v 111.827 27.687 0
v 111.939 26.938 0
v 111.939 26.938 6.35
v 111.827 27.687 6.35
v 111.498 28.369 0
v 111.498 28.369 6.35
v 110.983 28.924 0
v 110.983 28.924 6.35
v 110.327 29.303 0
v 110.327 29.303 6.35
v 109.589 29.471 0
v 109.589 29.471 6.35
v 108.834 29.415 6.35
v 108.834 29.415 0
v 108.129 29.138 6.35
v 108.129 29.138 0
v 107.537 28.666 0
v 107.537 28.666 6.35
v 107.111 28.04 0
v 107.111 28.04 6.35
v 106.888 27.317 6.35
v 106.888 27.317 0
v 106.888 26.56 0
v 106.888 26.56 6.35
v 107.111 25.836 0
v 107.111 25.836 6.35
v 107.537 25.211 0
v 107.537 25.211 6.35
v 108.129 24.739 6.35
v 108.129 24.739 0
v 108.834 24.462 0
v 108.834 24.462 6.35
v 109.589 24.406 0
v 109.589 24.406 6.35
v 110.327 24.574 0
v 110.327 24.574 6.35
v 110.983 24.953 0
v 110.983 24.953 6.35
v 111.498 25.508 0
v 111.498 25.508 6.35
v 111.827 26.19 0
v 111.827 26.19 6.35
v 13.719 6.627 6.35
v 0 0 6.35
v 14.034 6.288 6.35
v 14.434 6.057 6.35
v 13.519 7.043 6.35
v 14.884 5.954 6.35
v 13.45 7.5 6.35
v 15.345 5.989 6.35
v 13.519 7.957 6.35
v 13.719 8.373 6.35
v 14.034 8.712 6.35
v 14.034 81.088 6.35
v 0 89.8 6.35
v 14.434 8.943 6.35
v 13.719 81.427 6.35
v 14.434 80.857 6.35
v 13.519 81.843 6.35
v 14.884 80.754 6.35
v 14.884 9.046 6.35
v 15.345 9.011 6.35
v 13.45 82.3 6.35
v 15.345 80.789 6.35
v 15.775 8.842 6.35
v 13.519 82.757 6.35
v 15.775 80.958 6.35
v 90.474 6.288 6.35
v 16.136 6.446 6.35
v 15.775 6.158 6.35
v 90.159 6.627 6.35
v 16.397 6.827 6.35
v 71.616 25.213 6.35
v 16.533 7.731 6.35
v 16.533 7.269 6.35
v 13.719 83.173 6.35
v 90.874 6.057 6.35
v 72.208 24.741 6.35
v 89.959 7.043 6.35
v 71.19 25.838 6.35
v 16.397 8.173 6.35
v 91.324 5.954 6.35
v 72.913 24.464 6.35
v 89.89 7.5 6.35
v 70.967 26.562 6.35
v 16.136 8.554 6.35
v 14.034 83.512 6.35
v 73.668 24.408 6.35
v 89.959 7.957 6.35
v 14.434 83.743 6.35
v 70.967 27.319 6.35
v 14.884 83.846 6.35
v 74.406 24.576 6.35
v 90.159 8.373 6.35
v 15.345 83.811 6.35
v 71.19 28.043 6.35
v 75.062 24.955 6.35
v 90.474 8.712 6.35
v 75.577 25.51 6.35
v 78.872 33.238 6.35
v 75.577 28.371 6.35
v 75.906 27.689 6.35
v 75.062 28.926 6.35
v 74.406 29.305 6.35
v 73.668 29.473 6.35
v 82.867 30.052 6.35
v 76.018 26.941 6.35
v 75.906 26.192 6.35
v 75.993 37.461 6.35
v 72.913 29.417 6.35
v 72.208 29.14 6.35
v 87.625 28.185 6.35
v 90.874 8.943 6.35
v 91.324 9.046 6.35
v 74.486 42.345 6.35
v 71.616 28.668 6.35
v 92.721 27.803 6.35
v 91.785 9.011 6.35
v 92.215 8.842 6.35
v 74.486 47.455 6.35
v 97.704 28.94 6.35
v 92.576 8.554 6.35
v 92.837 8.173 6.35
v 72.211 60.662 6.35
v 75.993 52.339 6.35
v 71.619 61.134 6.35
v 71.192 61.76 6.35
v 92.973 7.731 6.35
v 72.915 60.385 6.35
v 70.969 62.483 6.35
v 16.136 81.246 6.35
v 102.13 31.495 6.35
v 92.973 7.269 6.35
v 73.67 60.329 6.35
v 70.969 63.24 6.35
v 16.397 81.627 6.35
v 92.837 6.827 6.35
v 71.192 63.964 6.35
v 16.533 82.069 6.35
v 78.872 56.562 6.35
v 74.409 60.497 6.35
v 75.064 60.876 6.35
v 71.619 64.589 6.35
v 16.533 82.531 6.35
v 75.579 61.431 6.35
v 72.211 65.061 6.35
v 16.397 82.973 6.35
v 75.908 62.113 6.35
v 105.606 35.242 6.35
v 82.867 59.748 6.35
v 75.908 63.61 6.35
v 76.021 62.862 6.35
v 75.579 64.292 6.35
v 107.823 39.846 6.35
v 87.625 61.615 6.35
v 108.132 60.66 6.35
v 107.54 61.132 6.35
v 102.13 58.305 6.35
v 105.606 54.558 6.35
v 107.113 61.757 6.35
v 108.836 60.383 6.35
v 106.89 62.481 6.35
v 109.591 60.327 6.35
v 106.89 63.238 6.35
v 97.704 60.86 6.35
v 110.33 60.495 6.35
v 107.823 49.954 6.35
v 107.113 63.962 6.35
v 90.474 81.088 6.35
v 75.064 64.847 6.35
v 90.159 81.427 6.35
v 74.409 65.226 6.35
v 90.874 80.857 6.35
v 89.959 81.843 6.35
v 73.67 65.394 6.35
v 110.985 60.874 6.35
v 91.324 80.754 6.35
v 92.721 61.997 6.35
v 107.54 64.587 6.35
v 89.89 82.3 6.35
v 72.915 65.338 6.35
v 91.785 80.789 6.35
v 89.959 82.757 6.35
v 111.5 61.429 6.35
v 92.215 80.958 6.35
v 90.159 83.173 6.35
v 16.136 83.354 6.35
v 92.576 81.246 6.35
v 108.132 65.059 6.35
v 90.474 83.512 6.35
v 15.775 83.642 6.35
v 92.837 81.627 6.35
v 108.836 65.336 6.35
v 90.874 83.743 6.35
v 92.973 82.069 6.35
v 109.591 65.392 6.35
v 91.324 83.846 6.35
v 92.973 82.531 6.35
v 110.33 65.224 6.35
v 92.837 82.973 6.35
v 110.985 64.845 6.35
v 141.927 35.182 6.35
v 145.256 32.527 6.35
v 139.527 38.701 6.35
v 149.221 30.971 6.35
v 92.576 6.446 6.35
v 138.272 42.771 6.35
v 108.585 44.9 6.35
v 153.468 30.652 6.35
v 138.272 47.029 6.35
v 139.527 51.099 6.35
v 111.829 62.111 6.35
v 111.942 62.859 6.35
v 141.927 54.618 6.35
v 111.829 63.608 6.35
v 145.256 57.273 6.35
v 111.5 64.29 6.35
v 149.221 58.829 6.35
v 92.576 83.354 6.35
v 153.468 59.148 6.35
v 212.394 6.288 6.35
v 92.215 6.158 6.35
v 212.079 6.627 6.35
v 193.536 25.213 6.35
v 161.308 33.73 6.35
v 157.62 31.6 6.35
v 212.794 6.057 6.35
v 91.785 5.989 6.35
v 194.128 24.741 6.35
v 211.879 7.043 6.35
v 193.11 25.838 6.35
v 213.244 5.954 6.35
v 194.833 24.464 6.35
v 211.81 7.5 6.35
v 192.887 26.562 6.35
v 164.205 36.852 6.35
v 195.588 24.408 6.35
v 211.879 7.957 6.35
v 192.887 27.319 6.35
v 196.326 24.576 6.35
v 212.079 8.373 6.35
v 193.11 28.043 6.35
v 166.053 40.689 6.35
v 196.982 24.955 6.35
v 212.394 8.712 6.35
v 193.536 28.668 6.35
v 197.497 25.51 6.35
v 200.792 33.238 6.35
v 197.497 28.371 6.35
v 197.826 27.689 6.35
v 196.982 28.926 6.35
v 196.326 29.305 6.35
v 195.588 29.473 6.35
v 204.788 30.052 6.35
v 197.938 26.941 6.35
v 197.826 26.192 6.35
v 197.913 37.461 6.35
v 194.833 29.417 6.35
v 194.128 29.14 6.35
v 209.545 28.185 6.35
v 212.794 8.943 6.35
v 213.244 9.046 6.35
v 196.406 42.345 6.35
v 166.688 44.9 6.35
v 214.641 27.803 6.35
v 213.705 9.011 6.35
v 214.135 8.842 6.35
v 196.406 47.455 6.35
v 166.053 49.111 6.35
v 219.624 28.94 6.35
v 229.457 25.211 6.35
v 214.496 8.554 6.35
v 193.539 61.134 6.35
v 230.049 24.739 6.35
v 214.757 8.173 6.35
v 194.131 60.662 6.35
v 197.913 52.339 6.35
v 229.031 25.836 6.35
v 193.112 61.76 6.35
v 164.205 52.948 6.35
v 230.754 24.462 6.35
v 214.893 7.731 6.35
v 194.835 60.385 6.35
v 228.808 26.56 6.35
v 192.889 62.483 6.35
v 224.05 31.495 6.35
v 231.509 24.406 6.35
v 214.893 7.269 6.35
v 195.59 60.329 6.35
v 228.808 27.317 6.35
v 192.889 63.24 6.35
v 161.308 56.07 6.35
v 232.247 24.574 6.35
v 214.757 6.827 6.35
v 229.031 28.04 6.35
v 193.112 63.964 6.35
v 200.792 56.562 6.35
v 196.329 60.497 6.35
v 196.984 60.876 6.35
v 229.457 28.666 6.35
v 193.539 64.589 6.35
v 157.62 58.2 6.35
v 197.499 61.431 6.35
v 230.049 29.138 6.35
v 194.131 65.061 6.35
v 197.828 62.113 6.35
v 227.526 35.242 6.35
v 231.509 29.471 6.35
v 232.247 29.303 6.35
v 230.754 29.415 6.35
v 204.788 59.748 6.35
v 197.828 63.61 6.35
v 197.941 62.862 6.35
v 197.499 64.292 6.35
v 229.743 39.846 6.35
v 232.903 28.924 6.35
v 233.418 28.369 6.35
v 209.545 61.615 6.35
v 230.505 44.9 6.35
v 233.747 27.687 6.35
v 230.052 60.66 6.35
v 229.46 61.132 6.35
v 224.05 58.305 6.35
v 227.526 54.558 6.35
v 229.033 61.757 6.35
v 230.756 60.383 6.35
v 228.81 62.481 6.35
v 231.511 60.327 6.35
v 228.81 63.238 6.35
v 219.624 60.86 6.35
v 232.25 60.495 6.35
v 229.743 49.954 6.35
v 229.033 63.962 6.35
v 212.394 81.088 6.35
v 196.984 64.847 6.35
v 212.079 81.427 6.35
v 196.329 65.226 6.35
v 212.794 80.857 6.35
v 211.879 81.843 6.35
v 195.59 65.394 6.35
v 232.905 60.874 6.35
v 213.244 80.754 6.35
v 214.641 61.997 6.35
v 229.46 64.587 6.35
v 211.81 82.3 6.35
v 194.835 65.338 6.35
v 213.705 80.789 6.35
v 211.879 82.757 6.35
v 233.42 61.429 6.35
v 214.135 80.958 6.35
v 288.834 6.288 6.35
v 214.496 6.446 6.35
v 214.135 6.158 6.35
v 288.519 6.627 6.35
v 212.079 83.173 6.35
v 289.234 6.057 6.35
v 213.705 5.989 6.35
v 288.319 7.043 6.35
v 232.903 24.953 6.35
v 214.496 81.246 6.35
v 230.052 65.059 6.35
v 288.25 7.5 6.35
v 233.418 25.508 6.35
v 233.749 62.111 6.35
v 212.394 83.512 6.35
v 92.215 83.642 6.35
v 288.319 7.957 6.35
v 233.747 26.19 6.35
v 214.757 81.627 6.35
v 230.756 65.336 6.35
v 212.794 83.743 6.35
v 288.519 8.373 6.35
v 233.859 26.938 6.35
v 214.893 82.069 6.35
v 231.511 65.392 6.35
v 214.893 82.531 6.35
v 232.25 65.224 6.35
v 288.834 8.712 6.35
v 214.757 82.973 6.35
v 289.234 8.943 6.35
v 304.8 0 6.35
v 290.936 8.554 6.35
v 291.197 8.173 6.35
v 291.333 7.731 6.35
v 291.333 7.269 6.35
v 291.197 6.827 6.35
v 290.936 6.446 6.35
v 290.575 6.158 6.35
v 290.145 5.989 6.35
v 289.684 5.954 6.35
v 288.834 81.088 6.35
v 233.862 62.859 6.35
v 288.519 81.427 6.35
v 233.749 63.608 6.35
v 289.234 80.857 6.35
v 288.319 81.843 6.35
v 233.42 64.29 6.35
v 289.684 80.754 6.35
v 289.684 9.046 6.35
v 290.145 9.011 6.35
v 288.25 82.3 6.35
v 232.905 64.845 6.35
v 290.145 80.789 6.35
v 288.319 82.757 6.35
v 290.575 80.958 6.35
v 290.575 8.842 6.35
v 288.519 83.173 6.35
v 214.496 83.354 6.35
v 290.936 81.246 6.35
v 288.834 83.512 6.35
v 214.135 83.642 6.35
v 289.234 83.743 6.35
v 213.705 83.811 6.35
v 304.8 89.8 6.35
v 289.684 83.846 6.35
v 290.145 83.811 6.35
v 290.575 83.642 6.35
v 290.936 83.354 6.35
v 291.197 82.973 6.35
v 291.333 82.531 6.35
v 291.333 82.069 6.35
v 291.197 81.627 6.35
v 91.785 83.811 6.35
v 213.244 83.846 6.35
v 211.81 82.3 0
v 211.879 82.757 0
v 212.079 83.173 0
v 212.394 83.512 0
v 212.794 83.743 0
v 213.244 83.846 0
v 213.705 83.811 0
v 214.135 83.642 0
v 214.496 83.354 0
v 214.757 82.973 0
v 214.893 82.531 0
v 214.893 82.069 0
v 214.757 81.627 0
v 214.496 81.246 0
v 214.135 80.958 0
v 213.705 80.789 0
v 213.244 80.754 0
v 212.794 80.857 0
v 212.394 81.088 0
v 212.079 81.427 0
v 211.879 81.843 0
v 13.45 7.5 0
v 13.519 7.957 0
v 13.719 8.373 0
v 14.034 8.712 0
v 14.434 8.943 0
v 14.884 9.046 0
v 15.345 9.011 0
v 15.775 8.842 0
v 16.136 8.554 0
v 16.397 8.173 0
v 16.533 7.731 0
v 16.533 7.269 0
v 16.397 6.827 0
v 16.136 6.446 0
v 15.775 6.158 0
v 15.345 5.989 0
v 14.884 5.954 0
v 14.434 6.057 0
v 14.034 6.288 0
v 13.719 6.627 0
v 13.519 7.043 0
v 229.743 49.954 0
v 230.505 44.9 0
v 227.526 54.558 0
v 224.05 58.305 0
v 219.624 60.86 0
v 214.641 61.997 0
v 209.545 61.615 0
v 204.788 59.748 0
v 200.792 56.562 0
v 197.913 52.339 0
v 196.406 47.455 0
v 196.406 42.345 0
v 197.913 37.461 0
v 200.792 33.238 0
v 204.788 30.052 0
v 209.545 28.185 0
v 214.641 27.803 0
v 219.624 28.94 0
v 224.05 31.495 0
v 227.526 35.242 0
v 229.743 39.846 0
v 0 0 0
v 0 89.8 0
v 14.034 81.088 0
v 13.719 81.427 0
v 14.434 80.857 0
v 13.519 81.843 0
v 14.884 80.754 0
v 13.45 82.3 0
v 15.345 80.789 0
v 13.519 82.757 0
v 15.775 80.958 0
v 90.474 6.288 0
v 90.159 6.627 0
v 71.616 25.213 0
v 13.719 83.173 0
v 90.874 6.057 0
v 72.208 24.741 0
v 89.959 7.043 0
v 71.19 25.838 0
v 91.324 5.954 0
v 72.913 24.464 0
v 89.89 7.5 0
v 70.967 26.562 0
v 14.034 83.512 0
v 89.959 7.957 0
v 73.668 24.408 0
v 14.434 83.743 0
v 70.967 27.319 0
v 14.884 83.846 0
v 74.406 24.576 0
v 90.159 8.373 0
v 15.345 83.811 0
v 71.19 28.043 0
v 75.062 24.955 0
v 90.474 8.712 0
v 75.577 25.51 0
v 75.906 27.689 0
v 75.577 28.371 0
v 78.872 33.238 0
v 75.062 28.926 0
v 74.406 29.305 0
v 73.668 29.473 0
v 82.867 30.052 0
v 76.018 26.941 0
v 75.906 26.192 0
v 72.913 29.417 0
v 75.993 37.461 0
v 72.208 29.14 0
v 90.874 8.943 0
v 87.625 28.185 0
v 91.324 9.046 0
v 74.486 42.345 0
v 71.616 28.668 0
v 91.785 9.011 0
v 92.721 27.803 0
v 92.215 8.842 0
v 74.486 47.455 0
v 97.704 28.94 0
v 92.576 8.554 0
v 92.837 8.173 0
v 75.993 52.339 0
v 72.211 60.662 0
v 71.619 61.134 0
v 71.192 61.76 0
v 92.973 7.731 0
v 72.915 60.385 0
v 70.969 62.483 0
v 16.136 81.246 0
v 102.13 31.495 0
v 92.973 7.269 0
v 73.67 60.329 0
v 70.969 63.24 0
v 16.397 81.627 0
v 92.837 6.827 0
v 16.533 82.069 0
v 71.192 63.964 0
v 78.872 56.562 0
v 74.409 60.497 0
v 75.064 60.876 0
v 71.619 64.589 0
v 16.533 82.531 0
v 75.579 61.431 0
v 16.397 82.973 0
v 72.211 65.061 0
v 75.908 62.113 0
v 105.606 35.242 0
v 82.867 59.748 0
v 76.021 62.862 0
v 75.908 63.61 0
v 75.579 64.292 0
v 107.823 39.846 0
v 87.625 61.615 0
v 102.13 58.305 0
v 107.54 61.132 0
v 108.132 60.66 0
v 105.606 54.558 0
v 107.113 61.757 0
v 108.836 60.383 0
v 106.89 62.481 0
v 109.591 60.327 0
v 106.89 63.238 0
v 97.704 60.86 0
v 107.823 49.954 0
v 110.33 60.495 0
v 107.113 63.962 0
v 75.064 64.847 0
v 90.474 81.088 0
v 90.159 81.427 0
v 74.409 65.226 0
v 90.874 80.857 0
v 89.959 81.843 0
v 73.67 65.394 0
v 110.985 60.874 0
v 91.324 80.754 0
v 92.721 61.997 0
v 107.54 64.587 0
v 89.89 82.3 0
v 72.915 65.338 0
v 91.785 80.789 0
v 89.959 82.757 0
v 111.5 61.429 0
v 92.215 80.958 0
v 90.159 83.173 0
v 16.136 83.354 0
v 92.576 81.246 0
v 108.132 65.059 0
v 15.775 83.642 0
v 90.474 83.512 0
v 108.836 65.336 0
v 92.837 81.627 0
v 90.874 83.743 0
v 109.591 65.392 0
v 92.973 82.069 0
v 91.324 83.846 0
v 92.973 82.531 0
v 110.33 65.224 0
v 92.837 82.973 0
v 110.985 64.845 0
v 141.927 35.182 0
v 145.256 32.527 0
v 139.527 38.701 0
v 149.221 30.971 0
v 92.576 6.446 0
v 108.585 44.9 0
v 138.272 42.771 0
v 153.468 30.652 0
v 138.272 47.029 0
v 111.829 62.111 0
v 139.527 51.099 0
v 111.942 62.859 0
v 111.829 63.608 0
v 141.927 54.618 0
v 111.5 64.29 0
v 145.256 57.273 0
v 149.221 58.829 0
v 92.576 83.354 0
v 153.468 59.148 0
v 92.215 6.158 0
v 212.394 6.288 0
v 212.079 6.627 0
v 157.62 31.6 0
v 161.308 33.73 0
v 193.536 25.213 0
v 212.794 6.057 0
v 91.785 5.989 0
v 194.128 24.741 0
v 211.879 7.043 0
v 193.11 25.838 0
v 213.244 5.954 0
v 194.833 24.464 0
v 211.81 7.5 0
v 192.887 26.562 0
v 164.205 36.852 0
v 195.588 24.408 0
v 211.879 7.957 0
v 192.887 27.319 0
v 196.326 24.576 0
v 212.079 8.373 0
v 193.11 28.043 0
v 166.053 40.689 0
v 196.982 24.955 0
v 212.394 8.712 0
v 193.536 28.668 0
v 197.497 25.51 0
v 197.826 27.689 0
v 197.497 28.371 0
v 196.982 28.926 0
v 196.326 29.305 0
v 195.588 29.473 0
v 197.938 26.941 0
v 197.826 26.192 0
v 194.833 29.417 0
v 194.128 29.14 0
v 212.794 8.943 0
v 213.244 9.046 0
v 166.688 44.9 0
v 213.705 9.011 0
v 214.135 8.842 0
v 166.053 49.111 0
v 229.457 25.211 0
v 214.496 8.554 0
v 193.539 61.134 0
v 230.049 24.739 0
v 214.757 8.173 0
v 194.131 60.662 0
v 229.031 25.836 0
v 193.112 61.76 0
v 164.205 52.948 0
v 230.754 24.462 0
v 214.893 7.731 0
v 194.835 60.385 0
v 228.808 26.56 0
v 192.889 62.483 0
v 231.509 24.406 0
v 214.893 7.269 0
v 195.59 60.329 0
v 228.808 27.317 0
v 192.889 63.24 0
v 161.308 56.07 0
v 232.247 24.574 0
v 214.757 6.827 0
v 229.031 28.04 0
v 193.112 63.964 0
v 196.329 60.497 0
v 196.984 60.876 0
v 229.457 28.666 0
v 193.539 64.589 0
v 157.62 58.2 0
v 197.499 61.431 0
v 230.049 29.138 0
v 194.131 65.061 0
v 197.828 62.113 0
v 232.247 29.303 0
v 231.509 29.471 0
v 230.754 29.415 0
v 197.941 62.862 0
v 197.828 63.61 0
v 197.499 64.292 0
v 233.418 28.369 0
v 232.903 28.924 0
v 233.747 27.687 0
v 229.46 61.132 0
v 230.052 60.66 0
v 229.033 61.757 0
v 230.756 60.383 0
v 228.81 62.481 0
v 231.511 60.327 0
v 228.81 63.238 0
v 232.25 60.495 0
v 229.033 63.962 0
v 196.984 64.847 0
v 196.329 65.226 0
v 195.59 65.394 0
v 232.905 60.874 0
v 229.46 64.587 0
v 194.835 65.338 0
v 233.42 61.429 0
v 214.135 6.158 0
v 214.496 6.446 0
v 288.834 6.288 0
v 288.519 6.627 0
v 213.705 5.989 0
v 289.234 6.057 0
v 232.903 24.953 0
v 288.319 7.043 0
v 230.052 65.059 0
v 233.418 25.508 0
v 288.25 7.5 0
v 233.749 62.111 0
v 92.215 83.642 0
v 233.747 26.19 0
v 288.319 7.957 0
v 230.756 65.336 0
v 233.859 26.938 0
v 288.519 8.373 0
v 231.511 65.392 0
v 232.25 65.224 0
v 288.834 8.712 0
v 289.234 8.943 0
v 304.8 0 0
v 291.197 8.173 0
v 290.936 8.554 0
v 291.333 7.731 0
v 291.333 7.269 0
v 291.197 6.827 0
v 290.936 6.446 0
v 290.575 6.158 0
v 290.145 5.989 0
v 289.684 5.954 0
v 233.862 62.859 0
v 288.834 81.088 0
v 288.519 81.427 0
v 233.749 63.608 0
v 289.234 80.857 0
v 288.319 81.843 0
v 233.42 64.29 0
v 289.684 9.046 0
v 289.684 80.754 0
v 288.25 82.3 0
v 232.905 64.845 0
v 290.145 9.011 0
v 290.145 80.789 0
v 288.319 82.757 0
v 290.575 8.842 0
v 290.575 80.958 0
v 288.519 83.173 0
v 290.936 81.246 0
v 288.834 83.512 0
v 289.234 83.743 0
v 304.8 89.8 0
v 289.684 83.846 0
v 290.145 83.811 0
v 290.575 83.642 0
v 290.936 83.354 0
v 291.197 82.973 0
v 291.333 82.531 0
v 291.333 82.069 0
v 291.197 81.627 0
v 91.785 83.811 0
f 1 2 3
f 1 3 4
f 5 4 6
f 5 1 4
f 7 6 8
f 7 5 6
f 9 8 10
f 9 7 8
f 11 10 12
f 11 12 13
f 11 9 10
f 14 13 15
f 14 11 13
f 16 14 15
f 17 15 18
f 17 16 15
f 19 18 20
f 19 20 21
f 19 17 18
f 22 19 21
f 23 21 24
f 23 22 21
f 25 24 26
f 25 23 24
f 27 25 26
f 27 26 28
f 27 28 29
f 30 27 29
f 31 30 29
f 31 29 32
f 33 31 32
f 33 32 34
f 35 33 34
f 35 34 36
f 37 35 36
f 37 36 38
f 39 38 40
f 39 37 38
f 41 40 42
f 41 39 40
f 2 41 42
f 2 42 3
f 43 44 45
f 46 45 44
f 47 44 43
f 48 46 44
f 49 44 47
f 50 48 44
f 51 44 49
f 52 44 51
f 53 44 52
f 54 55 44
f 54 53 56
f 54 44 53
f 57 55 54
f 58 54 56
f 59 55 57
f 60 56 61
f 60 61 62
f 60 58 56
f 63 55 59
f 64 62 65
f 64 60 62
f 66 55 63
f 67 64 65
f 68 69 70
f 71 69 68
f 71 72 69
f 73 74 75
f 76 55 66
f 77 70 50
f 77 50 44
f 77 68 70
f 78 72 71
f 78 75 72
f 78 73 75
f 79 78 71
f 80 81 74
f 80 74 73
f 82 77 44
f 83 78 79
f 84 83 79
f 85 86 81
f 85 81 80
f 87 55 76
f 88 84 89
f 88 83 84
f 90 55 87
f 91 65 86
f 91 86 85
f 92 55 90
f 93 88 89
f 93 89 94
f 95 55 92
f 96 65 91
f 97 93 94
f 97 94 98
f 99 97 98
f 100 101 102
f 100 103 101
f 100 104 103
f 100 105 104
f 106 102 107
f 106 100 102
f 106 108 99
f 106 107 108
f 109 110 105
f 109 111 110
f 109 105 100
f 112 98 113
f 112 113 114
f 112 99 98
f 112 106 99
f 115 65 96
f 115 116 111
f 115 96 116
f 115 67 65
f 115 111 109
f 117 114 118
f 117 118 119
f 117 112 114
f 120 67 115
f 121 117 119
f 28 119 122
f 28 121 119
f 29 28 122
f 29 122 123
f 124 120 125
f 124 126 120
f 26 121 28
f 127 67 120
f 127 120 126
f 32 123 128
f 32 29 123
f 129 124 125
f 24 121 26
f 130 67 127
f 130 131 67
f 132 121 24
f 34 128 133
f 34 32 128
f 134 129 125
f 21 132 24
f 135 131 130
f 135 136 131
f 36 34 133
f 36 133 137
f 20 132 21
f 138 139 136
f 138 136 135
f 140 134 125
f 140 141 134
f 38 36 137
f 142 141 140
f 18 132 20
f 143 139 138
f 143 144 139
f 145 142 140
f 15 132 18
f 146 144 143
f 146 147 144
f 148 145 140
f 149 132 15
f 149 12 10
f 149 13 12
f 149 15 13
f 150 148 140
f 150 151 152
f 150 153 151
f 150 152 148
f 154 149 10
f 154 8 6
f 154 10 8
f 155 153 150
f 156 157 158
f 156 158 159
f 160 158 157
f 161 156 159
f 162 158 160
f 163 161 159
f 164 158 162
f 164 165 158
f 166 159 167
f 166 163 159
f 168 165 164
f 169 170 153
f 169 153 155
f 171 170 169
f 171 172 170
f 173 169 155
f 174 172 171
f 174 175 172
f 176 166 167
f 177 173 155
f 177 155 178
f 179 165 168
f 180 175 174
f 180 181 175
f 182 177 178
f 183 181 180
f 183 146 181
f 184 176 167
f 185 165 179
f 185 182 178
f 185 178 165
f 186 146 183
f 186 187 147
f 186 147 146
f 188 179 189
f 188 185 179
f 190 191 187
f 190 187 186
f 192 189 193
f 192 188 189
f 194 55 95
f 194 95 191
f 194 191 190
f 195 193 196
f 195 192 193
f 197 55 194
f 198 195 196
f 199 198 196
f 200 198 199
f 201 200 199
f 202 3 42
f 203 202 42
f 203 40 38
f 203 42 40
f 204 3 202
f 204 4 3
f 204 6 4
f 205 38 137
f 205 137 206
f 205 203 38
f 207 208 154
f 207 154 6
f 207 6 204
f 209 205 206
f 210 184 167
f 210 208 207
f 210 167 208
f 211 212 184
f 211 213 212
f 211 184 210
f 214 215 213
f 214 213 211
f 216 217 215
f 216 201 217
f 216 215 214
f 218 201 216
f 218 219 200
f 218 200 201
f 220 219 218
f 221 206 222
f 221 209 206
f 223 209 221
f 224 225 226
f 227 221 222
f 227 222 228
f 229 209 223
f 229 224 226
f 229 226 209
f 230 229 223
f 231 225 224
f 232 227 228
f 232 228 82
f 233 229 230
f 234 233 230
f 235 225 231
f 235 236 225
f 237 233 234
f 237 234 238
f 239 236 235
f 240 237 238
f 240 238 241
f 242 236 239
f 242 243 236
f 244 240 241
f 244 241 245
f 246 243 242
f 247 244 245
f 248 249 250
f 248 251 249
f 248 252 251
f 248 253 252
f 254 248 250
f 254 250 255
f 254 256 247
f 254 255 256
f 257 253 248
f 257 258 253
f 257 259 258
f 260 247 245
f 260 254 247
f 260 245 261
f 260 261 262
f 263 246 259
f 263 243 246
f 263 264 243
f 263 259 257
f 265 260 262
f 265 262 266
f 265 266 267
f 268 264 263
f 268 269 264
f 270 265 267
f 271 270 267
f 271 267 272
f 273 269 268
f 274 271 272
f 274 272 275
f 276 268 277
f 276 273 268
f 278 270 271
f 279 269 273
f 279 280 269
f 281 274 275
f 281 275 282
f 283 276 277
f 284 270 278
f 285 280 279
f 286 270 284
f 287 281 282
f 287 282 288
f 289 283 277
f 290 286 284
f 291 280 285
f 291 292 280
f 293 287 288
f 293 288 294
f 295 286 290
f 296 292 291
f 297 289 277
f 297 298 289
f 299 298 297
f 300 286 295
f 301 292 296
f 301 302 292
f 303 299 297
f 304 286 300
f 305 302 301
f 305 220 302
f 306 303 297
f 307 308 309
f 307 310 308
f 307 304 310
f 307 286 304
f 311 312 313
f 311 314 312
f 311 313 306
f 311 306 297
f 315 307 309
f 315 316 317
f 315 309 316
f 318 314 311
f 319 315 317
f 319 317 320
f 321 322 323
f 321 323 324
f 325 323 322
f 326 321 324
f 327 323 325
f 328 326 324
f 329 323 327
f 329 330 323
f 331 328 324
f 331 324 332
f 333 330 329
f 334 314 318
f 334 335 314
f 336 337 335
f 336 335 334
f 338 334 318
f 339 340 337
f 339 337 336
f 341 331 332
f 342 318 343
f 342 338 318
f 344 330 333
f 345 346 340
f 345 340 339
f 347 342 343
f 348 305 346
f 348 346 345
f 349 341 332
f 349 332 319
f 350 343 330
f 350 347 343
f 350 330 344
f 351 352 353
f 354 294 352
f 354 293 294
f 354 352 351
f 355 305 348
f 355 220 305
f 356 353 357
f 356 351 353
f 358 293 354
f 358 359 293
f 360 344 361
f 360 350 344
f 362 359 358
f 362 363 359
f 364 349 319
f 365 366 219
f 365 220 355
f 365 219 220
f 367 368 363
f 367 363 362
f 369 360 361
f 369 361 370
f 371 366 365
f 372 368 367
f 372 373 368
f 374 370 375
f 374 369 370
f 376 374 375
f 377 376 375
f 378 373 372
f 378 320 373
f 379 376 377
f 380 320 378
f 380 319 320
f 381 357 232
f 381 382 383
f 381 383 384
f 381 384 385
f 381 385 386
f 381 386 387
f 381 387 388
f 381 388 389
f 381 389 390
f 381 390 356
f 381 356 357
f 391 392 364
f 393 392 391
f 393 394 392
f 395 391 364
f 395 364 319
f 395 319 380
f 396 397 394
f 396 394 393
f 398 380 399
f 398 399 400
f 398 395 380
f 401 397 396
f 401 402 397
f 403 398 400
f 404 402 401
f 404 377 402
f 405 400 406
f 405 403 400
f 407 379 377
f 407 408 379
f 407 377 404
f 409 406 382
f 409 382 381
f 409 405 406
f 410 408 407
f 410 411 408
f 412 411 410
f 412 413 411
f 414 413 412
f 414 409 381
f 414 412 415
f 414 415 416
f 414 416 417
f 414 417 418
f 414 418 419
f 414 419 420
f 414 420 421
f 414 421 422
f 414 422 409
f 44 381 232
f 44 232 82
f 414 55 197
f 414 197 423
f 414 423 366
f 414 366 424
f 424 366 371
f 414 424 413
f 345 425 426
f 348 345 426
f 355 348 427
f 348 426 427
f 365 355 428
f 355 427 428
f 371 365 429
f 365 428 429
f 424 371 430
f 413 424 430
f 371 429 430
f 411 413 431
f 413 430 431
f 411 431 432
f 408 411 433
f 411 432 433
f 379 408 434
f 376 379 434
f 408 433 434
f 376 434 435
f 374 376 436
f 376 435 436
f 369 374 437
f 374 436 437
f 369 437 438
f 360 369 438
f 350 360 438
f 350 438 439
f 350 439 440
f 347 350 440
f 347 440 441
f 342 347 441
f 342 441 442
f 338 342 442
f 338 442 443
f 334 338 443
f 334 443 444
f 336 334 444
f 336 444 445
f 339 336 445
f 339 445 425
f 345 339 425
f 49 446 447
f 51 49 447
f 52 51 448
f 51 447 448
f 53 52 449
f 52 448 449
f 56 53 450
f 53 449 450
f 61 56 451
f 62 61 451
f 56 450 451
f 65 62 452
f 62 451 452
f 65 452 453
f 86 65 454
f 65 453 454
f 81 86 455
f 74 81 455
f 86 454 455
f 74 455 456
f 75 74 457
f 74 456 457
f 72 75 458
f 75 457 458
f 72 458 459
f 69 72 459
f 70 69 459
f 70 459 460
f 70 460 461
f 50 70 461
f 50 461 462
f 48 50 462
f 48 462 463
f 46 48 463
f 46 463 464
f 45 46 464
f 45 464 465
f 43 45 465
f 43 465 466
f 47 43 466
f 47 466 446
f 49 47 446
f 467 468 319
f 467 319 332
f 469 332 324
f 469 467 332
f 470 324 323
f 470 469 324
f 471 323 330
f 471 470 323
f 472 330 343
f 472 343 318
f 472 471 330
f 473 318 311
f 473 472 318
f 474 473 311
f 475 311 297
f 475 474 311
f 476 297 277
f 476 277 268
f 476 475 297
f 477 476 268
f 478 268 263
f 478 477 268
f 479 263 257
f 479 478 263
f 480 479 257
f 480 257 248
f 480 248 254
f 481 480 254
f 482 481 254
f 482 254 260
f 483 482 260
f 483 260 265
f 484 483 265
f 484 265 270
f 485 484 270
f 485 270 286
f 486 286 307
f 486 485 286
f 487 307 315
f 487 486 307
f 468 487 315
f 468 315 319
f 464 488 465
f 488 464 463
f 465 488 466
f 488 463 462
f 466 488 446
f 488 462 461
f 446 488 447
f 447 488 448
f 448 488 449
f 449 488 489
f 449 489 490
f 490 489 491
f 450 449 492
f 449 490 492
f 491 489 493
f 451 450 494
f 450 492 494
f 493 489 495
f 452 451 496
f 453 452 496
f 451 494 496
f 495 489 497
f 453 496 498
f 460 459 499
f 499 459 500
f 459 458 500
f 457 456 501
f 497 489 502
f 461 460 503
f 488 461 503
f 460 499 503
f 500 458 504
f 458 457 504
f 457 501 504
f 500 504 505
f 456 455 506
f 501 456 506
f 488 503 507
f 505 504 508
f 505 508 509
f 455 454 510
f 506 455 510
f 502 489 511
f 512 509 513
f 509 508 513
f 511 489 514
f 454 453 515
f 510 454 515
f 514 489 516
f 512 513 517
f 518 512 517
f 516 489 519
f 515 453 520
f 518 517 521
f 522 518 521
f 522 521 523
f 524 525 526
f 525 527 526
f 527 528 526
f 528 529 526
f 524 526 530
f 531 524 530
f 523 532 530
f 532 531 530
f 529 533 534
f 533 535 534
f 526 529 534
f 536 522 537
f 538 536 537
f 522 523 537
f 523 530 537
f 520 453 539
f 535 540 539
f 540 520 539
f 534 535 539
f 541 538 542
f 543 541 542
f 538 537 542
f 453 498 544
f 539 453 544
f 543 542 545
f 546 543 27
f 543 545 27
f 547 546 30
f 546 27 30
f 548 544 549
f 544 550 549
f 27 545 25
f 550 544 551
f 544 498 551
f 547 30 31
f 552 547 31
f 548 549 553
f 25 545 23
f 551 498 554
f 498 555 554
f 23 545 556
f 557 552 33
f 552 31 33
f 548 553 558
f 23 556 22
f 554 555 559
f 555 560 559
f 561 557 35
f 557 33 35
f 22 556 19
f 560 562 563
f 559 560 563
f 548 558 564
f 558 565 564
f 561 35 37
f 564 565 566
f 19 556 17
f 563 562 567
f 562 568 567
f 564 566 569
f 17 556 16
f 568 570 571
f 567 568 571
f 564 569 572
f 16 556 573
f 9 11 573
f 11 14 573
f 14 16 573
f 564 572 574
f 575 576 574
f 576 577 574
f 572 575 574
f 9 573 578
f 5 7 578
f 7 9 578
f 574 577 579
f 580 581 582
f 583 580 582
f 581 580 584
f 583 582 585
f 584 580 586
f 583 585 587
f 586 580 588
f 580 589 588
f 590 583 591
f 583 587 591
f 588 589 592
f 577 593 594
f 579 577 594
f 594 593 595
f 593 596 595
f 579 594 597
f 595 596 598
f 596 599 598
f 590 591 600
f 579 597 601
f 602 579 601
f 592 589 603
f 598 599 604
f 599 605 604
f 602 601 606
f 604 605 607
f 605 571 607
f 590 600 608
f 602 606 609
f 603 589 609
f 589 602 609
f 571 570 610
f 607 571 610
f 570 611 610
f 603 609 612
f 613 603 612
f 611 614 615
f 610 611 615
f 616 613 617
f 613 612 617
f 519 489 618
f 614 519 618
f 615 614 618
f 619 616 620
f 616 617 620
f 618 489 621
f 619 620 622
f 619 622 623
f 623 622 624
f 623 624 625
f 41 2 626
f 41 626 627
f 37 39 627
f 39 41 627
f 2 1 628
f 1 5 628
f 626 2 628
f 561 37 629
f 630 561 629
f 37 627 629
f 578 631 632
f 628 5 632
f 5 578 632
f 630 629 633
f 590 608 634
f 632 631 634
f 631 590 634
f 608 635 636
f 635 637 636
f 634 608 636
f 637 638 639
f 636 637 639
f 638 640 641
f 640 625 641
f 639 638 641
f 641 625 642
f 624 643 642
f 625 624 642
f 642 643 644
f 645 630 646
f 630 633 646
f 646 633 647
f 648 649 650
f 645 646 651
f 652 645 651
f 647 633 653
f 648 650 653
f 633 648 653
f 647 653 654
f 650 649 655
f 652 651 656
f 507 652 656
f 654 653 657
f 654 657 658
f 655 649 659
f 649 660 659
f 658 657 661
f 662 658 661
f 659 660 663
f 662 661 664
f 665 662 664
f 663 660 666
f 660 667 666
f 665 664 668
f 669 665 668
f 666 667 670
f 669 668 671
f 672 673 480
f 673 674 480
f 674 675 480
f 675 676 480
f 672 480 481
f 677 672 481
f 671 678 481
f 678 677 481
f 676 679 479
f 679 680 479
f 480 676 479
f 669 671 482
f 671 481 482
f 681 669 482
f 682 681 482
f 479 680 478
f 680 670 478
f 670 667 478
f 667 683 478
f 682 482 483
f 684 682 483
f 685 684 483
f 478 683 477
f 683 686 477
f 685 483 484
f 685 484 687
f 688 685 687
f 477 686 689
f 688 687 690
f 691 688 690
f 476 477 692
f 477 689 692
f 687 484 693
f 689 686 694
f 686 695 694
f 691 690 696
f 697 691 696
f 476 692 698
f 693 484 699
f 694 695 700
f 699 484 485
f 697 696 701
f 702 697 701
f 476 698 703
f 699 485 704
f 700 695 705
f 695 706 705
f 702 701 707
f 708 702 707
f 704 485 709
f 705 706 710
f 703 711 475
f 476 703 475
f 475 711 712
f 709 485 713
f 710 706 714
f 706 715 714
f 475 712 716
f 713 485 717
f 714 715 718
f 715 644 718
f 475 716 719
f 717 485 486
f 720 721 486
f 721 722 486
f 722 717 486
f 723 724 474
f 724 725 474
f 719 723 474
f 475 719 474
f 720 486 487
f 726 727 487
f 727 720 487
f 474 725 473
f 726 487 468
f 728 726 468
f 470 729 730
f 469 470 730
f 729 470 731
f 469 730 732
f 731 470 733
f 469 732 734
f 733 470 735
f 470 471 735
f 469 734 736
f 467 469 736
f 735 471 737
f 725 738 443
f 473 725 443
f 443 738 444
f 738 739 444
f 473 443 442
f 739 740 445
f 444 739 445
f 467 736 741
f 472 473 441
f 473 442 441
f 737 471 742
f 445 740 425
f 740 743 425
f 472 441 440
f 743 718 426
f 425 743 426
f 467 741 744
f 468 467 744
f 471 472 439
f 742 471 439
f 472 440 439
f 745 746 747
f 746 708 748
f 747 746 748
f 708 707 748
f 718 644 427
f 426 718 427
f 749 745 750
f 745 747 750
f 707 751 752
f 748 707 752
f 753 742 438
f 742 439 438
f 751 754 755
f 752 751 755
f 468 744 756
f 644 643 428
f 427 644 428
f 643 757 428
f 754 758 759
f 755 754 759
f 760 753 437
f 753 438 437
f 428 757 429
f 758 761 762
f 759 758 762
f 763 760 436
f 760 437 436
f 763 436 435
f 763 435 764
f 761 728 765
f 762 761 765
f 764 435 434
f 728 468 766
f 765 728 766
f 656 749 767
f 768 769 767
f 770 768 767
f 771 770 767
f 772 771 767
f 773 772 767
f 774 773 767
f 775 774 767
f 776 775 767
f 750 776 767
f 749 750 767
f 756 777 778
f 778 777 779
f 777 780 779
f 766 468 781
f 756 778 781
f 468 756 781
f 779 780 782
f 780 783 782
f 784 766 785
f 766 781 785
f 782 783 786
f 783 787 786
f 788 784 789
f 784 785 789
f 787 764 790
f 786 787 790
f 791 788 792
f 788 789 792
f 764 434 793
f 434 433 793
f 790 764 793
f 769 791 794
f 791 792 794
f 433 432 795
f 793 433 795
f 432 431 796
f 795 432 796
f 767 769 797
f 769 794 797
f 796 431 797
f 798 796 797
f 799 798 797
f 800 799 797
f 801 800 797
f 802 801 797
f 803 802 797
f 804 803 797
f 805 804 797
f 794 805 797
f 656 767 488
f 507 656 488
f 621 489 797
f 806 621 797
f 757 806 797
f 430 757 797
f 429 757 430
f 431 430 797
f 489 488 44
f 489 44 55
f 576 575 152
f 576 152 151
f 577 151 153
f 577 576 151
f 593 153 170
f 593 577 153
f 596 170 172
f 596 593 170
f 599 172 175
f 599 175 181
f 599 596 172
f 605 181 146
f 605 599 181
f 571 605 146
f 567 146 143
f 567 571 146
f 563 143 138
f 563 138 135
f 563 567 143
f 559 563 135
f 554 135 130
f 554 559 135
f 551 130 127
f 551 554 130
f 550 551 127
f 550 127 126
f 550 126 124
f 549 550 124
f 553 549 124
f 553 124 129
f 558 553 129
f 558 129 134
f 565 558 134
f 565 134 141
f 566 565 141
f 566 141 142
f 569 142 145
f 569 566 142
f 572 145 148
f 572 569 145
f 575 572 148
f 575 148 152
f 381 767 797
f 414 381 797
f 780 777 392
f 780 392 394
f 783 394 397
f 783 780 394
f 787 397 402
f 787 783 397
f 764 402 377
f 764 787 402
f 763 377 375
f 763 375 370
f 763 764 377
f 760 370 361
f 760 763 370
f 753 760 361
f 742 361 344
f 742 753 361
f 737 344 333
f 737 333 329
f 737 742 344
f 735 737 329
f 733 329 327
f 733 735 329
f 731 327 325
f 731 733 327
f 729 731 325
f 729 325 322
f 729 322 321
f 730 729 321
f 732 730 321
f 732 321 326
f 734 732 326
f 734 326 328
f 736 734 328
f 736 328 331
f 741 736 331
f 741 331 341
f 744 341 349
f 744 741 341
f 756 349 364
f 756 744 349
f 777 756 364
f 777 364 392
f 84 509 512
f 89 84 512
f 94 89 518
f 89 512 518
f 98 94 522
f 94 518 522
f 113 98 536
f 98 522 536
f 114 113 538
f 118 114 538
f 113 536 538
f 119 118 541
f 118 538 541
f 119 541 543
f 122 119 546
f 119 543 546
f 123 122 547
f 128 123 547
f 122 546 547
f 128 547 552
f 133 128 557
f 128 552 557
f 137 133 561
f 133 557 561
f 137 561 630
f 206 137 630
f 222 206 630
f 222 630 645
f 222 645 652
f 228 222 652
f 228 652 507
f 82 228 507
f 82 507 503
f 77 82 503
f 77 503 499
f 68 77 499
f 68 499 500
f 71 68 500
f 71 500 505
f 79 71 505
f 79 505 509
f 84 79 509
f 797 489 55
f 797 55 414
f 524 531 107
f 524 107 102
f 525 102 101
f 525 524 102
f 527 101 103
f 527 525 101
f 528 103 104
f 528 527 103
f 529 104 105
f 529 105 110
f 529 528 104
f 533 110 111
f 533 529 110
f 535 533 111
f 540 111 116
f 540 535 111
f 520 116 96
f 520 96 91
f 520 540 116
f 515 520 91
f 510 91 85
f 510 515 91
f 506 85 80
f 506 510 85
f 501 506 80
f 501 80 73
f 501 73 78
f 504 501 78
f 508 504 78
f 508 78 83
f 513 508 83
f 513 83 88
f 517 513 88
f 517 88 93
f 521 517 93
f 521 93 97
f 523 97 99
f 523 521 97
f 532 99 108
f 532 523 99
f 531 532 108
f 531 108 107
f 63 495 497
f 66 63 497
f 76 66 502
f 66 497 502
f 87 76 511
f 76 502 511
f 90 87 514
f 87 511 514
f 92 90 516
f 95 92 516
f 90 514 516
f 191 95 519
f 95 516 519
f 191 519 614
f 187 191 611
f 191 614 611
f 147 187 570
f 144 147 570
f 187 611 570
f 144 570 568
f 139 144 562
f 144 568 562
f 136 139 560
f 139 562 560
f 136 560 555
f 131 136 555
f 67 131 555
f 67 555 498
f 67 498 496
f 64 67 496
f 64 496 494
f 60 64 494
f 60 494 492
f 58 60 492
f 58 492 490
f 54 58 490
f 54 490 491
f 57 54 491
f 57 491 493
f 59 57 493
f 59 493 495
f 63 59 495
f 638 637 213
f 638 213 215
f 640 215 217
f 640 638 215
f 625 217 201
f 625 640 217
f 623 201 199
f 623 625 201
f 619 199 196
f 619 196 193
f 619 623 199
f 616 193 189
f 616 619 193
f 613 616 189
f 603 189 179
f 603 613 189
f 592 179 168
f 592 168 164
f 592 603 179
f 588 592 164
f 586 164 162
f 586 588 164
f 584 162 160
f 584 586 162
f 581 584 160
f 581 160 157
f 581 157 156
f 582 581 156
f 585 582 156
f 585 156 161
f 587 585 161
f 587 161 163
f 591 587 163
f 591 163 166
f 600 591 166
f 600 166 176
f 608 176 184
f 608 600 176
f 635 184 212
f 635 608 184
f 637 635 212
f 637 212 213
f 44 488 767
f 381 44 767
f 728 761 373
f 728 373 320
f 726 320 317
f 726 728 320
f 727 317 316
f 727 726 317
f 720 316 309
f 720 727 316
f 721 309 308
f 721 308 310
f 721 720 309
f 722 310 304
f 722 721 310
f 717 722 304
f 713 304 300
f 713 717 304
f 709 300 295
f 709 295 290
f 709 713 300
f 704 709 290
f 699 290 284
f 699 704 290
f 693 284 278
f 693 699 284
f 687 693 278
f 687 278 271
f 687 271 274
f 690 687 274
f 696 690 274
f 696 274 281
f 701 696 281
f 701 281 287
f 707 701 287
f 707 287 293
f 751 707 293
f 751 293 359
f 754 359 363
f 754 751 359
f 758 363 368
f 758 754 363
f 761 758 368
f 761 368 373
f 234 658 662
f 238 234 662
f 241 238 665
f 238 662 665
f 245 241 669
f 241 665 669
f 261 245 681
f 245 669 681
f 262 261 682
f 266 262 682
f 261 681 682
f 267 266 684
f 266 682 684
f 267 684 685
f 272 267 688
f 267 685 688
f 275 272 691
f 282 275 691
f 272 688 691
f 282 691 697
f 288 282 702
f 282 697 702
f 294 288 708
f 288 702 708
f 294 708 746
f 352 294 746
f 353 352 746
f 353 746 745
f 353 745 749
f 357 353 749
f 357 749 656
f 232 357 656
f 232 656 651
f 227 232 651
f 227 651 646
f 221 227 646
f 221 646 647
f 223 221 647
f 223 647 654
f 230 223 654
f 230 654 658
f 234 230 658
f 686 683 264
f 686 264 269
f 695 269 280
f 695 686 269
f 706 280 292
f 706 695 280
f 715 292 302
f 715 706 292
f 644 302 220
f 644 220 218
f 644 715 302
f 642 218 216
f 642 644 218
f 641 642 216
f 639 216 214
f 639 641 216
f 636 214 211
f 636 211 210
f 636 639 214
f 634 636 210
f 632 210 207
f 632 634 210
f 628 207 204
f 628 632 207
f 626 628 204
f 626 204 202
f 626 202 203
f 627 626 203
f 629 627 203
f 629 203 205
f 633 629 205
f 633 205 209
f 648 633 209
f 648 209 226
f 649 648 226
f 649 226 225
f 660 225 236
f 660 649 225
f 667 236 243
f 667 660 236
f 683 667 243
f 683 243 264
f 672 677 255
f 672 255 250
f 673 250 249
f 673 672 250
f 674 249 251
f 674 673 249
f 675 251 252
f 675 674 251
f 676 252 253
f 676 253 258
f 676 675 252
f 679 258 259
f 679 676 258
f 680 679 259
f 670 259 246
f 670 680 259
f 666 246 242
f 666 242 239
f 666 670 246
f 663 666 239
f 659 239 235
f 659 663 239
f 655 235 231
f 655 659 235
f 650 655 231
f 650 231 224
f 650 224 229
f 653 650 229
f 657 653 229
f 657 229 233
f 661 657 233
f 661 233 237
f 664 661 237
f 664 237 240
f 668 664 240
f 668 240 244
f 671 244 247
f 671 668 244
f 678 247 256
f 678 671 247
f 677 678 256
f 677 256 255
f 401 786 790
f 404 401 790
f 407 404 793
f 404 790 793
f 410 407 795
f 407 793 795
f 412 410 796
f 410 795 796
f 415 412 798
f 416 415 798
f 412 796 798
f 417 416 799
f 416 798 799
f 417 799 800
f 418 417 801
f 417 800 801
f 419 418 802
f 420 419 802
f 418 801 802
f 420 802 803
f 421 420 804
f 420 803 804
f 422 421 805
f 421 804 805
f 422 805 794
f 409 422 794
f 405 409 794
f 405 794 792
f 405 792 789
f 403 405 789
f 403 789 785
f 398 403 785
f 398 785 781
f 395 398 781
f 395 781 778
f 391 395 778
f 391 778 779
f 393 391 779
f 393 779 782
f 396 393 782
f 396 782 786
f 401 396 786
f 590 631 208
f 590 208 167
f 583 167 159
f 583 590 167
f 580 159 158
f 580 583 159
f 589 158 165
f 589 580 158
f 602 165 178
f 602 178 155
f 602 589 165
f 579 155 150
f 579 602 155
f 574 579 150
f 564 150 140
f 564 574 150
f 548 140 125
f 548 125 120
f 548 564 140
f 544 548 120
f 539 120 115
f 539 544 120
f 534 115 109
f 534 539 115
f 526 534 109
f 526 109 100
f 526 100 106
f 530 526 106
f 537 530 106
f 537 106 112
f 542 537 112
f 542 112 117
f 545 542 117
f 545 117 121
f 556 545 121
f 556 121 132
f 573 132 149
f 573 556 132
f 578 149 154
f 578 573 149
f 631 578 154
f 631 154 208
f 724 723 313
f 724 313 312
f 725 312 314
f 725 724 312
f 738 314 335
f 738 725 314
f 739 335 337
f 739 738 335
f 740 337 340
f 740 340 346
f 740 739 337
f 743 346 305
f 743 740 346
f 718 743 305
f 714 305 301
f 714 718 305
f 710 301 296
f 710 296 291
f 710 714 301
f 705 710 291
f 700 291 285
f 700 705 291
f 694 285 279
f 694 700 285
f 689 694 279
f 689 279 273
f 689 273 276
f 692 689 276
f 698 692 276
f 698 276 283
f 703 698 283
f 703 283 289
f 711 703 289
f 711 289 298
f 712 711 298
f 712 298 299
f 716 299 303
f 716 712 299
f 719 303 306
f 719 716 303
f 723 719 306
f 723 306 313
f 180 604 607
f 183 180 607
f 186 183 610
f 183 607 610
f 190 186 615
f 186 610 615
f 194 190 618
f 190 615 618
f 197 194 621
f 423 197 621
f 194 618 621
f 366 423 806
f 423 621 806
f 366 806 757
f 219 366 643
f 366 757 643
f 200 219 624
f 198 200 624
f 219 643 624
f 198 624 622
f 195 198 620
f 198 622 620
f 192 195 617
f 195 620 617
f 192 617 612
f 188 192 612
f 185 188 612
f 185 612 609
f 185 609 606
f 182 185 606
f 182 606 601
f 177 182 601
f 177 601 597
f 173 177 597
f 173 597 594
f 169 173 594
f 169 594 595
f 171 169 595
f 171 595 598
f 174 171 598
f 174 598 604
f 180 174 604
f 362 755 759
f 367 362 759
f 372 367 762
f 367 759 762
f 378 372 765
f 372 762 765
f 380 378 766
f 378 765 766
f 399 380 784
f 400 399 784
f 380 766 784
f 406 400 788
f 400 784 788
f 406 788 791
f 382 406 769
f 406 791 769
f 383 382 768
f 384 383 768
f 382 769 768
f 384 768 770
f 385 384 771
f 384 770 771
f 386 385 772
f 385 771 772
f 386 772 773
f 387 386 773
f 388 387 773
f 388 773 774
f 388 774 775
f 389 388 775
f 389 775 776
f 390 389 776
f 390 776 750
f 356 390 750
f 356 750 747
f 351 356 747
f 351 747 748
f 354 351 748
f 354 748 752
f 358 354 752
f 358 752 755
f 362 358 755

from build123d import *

# Parameters (mm, degrees)
SKETCH1_W           = 304.8
SKETCH1_H           = 89.8
SKETCH1_R           = 14.2875
SKETCH1_R_2         = 2.54
SKETCH1_R_3         = 17.145
BOSS_EXTRUDE1_DEPTH = 6.35
SKETCH2_R           = 1.55
CUT_EXTRUDE1_DEPTH  = 10


with BuildPart() as part:
    # Sketch1 → Boss-Extrude1 (new body)
    with BuildSketch(Plane.XY):
        with Locations((152.4, 44.9)):
            Rectangle(SKETCH1_W, SKETCH1_H)
        with Locations((152.4, 44.9)):
            Circle(SKETCH1_R, mode=Mode.SUBTRACT)
        with Locations((109.401585406, 62.859439014)):
            Circle(SKETCH1_R_2, mode=Mode.SUBTRACT)
        with Locations((109.399439014, 26.938414594)):
            Circle(SKETCH1_R_2, mode=Mode.SUBTRACT)
        with Locations((73.478414594, 26.940560986)):
            Circle(SKETCH1_R_2, mode=Mode.SUBTRACT)
        with Locations((73.480560986, 62.861585406)):
            Circle(SKETCH1_R_2, mode=Mode.SUBTRACT)
        with Locations((91.44, 44.9)):
            Circle(SKETCH1_R_3, mode=Mode.SUBTRACT)
        with Locations((195.400560986, 62.861585406)):
            Circle(SKETCH1_R_2, mode=Mode.SUBTRACT)
        with Locations((231.321585406, 62.859439014)):
            Circle(SKETCH1_R_2, mode=Mode.SUBTRACT)
        with Locations((231.319439014, 26.938414594)):
            Circle(SKETCH1_R_2, mode=Mode.SUBTRACT)
        with Locations((195.398414594, 26.940560986)):
            Circle(SKETCH1_R_2, mode=Mode.SUBTRACT)
        with Locations((213.36, 44.9)):
            Circle(SKETCH1_R_3, mode=Mode.SUBTRACT)
    extrude(amount=BOSS_EXTRUDE1_DEPTH)

    # Sketch2 → Cut-Extrude1 (cut)
    with BuildSketch(Plane(origin=(0, 0, 0), x_dir=(-1, 0, 0), z_dir=(0, 0, -1))):
        with Locations((-289.8, 82.3)):
            Circle(SKETCH2_R)
        with Locations((-213.36, 82.3)):
            Circle(SKETCH2_R)
        with Locations((-91.44, 82.3)):
            Circle(SKETCH2_R)
        with Locations((-15, 82.3)):
            Circle(SKETCH2_R)
        with Locations((-15, 7.5)):
            Circle(SKETCH2_R)
        with Locations((-91.44, 7.5)):
            Circle(SKETCH2_R)
        with Locations((-213.36, 7.5)):
            Circle(SKETCH2_R)
        with Locations((-289.8, 7.5)):
            Circle(SKETCH2_R)
    extrude(amount=-CUT_EXTRUDE1_DEPTH, mode=Mode.SUBTRACT)


solid = part.part
